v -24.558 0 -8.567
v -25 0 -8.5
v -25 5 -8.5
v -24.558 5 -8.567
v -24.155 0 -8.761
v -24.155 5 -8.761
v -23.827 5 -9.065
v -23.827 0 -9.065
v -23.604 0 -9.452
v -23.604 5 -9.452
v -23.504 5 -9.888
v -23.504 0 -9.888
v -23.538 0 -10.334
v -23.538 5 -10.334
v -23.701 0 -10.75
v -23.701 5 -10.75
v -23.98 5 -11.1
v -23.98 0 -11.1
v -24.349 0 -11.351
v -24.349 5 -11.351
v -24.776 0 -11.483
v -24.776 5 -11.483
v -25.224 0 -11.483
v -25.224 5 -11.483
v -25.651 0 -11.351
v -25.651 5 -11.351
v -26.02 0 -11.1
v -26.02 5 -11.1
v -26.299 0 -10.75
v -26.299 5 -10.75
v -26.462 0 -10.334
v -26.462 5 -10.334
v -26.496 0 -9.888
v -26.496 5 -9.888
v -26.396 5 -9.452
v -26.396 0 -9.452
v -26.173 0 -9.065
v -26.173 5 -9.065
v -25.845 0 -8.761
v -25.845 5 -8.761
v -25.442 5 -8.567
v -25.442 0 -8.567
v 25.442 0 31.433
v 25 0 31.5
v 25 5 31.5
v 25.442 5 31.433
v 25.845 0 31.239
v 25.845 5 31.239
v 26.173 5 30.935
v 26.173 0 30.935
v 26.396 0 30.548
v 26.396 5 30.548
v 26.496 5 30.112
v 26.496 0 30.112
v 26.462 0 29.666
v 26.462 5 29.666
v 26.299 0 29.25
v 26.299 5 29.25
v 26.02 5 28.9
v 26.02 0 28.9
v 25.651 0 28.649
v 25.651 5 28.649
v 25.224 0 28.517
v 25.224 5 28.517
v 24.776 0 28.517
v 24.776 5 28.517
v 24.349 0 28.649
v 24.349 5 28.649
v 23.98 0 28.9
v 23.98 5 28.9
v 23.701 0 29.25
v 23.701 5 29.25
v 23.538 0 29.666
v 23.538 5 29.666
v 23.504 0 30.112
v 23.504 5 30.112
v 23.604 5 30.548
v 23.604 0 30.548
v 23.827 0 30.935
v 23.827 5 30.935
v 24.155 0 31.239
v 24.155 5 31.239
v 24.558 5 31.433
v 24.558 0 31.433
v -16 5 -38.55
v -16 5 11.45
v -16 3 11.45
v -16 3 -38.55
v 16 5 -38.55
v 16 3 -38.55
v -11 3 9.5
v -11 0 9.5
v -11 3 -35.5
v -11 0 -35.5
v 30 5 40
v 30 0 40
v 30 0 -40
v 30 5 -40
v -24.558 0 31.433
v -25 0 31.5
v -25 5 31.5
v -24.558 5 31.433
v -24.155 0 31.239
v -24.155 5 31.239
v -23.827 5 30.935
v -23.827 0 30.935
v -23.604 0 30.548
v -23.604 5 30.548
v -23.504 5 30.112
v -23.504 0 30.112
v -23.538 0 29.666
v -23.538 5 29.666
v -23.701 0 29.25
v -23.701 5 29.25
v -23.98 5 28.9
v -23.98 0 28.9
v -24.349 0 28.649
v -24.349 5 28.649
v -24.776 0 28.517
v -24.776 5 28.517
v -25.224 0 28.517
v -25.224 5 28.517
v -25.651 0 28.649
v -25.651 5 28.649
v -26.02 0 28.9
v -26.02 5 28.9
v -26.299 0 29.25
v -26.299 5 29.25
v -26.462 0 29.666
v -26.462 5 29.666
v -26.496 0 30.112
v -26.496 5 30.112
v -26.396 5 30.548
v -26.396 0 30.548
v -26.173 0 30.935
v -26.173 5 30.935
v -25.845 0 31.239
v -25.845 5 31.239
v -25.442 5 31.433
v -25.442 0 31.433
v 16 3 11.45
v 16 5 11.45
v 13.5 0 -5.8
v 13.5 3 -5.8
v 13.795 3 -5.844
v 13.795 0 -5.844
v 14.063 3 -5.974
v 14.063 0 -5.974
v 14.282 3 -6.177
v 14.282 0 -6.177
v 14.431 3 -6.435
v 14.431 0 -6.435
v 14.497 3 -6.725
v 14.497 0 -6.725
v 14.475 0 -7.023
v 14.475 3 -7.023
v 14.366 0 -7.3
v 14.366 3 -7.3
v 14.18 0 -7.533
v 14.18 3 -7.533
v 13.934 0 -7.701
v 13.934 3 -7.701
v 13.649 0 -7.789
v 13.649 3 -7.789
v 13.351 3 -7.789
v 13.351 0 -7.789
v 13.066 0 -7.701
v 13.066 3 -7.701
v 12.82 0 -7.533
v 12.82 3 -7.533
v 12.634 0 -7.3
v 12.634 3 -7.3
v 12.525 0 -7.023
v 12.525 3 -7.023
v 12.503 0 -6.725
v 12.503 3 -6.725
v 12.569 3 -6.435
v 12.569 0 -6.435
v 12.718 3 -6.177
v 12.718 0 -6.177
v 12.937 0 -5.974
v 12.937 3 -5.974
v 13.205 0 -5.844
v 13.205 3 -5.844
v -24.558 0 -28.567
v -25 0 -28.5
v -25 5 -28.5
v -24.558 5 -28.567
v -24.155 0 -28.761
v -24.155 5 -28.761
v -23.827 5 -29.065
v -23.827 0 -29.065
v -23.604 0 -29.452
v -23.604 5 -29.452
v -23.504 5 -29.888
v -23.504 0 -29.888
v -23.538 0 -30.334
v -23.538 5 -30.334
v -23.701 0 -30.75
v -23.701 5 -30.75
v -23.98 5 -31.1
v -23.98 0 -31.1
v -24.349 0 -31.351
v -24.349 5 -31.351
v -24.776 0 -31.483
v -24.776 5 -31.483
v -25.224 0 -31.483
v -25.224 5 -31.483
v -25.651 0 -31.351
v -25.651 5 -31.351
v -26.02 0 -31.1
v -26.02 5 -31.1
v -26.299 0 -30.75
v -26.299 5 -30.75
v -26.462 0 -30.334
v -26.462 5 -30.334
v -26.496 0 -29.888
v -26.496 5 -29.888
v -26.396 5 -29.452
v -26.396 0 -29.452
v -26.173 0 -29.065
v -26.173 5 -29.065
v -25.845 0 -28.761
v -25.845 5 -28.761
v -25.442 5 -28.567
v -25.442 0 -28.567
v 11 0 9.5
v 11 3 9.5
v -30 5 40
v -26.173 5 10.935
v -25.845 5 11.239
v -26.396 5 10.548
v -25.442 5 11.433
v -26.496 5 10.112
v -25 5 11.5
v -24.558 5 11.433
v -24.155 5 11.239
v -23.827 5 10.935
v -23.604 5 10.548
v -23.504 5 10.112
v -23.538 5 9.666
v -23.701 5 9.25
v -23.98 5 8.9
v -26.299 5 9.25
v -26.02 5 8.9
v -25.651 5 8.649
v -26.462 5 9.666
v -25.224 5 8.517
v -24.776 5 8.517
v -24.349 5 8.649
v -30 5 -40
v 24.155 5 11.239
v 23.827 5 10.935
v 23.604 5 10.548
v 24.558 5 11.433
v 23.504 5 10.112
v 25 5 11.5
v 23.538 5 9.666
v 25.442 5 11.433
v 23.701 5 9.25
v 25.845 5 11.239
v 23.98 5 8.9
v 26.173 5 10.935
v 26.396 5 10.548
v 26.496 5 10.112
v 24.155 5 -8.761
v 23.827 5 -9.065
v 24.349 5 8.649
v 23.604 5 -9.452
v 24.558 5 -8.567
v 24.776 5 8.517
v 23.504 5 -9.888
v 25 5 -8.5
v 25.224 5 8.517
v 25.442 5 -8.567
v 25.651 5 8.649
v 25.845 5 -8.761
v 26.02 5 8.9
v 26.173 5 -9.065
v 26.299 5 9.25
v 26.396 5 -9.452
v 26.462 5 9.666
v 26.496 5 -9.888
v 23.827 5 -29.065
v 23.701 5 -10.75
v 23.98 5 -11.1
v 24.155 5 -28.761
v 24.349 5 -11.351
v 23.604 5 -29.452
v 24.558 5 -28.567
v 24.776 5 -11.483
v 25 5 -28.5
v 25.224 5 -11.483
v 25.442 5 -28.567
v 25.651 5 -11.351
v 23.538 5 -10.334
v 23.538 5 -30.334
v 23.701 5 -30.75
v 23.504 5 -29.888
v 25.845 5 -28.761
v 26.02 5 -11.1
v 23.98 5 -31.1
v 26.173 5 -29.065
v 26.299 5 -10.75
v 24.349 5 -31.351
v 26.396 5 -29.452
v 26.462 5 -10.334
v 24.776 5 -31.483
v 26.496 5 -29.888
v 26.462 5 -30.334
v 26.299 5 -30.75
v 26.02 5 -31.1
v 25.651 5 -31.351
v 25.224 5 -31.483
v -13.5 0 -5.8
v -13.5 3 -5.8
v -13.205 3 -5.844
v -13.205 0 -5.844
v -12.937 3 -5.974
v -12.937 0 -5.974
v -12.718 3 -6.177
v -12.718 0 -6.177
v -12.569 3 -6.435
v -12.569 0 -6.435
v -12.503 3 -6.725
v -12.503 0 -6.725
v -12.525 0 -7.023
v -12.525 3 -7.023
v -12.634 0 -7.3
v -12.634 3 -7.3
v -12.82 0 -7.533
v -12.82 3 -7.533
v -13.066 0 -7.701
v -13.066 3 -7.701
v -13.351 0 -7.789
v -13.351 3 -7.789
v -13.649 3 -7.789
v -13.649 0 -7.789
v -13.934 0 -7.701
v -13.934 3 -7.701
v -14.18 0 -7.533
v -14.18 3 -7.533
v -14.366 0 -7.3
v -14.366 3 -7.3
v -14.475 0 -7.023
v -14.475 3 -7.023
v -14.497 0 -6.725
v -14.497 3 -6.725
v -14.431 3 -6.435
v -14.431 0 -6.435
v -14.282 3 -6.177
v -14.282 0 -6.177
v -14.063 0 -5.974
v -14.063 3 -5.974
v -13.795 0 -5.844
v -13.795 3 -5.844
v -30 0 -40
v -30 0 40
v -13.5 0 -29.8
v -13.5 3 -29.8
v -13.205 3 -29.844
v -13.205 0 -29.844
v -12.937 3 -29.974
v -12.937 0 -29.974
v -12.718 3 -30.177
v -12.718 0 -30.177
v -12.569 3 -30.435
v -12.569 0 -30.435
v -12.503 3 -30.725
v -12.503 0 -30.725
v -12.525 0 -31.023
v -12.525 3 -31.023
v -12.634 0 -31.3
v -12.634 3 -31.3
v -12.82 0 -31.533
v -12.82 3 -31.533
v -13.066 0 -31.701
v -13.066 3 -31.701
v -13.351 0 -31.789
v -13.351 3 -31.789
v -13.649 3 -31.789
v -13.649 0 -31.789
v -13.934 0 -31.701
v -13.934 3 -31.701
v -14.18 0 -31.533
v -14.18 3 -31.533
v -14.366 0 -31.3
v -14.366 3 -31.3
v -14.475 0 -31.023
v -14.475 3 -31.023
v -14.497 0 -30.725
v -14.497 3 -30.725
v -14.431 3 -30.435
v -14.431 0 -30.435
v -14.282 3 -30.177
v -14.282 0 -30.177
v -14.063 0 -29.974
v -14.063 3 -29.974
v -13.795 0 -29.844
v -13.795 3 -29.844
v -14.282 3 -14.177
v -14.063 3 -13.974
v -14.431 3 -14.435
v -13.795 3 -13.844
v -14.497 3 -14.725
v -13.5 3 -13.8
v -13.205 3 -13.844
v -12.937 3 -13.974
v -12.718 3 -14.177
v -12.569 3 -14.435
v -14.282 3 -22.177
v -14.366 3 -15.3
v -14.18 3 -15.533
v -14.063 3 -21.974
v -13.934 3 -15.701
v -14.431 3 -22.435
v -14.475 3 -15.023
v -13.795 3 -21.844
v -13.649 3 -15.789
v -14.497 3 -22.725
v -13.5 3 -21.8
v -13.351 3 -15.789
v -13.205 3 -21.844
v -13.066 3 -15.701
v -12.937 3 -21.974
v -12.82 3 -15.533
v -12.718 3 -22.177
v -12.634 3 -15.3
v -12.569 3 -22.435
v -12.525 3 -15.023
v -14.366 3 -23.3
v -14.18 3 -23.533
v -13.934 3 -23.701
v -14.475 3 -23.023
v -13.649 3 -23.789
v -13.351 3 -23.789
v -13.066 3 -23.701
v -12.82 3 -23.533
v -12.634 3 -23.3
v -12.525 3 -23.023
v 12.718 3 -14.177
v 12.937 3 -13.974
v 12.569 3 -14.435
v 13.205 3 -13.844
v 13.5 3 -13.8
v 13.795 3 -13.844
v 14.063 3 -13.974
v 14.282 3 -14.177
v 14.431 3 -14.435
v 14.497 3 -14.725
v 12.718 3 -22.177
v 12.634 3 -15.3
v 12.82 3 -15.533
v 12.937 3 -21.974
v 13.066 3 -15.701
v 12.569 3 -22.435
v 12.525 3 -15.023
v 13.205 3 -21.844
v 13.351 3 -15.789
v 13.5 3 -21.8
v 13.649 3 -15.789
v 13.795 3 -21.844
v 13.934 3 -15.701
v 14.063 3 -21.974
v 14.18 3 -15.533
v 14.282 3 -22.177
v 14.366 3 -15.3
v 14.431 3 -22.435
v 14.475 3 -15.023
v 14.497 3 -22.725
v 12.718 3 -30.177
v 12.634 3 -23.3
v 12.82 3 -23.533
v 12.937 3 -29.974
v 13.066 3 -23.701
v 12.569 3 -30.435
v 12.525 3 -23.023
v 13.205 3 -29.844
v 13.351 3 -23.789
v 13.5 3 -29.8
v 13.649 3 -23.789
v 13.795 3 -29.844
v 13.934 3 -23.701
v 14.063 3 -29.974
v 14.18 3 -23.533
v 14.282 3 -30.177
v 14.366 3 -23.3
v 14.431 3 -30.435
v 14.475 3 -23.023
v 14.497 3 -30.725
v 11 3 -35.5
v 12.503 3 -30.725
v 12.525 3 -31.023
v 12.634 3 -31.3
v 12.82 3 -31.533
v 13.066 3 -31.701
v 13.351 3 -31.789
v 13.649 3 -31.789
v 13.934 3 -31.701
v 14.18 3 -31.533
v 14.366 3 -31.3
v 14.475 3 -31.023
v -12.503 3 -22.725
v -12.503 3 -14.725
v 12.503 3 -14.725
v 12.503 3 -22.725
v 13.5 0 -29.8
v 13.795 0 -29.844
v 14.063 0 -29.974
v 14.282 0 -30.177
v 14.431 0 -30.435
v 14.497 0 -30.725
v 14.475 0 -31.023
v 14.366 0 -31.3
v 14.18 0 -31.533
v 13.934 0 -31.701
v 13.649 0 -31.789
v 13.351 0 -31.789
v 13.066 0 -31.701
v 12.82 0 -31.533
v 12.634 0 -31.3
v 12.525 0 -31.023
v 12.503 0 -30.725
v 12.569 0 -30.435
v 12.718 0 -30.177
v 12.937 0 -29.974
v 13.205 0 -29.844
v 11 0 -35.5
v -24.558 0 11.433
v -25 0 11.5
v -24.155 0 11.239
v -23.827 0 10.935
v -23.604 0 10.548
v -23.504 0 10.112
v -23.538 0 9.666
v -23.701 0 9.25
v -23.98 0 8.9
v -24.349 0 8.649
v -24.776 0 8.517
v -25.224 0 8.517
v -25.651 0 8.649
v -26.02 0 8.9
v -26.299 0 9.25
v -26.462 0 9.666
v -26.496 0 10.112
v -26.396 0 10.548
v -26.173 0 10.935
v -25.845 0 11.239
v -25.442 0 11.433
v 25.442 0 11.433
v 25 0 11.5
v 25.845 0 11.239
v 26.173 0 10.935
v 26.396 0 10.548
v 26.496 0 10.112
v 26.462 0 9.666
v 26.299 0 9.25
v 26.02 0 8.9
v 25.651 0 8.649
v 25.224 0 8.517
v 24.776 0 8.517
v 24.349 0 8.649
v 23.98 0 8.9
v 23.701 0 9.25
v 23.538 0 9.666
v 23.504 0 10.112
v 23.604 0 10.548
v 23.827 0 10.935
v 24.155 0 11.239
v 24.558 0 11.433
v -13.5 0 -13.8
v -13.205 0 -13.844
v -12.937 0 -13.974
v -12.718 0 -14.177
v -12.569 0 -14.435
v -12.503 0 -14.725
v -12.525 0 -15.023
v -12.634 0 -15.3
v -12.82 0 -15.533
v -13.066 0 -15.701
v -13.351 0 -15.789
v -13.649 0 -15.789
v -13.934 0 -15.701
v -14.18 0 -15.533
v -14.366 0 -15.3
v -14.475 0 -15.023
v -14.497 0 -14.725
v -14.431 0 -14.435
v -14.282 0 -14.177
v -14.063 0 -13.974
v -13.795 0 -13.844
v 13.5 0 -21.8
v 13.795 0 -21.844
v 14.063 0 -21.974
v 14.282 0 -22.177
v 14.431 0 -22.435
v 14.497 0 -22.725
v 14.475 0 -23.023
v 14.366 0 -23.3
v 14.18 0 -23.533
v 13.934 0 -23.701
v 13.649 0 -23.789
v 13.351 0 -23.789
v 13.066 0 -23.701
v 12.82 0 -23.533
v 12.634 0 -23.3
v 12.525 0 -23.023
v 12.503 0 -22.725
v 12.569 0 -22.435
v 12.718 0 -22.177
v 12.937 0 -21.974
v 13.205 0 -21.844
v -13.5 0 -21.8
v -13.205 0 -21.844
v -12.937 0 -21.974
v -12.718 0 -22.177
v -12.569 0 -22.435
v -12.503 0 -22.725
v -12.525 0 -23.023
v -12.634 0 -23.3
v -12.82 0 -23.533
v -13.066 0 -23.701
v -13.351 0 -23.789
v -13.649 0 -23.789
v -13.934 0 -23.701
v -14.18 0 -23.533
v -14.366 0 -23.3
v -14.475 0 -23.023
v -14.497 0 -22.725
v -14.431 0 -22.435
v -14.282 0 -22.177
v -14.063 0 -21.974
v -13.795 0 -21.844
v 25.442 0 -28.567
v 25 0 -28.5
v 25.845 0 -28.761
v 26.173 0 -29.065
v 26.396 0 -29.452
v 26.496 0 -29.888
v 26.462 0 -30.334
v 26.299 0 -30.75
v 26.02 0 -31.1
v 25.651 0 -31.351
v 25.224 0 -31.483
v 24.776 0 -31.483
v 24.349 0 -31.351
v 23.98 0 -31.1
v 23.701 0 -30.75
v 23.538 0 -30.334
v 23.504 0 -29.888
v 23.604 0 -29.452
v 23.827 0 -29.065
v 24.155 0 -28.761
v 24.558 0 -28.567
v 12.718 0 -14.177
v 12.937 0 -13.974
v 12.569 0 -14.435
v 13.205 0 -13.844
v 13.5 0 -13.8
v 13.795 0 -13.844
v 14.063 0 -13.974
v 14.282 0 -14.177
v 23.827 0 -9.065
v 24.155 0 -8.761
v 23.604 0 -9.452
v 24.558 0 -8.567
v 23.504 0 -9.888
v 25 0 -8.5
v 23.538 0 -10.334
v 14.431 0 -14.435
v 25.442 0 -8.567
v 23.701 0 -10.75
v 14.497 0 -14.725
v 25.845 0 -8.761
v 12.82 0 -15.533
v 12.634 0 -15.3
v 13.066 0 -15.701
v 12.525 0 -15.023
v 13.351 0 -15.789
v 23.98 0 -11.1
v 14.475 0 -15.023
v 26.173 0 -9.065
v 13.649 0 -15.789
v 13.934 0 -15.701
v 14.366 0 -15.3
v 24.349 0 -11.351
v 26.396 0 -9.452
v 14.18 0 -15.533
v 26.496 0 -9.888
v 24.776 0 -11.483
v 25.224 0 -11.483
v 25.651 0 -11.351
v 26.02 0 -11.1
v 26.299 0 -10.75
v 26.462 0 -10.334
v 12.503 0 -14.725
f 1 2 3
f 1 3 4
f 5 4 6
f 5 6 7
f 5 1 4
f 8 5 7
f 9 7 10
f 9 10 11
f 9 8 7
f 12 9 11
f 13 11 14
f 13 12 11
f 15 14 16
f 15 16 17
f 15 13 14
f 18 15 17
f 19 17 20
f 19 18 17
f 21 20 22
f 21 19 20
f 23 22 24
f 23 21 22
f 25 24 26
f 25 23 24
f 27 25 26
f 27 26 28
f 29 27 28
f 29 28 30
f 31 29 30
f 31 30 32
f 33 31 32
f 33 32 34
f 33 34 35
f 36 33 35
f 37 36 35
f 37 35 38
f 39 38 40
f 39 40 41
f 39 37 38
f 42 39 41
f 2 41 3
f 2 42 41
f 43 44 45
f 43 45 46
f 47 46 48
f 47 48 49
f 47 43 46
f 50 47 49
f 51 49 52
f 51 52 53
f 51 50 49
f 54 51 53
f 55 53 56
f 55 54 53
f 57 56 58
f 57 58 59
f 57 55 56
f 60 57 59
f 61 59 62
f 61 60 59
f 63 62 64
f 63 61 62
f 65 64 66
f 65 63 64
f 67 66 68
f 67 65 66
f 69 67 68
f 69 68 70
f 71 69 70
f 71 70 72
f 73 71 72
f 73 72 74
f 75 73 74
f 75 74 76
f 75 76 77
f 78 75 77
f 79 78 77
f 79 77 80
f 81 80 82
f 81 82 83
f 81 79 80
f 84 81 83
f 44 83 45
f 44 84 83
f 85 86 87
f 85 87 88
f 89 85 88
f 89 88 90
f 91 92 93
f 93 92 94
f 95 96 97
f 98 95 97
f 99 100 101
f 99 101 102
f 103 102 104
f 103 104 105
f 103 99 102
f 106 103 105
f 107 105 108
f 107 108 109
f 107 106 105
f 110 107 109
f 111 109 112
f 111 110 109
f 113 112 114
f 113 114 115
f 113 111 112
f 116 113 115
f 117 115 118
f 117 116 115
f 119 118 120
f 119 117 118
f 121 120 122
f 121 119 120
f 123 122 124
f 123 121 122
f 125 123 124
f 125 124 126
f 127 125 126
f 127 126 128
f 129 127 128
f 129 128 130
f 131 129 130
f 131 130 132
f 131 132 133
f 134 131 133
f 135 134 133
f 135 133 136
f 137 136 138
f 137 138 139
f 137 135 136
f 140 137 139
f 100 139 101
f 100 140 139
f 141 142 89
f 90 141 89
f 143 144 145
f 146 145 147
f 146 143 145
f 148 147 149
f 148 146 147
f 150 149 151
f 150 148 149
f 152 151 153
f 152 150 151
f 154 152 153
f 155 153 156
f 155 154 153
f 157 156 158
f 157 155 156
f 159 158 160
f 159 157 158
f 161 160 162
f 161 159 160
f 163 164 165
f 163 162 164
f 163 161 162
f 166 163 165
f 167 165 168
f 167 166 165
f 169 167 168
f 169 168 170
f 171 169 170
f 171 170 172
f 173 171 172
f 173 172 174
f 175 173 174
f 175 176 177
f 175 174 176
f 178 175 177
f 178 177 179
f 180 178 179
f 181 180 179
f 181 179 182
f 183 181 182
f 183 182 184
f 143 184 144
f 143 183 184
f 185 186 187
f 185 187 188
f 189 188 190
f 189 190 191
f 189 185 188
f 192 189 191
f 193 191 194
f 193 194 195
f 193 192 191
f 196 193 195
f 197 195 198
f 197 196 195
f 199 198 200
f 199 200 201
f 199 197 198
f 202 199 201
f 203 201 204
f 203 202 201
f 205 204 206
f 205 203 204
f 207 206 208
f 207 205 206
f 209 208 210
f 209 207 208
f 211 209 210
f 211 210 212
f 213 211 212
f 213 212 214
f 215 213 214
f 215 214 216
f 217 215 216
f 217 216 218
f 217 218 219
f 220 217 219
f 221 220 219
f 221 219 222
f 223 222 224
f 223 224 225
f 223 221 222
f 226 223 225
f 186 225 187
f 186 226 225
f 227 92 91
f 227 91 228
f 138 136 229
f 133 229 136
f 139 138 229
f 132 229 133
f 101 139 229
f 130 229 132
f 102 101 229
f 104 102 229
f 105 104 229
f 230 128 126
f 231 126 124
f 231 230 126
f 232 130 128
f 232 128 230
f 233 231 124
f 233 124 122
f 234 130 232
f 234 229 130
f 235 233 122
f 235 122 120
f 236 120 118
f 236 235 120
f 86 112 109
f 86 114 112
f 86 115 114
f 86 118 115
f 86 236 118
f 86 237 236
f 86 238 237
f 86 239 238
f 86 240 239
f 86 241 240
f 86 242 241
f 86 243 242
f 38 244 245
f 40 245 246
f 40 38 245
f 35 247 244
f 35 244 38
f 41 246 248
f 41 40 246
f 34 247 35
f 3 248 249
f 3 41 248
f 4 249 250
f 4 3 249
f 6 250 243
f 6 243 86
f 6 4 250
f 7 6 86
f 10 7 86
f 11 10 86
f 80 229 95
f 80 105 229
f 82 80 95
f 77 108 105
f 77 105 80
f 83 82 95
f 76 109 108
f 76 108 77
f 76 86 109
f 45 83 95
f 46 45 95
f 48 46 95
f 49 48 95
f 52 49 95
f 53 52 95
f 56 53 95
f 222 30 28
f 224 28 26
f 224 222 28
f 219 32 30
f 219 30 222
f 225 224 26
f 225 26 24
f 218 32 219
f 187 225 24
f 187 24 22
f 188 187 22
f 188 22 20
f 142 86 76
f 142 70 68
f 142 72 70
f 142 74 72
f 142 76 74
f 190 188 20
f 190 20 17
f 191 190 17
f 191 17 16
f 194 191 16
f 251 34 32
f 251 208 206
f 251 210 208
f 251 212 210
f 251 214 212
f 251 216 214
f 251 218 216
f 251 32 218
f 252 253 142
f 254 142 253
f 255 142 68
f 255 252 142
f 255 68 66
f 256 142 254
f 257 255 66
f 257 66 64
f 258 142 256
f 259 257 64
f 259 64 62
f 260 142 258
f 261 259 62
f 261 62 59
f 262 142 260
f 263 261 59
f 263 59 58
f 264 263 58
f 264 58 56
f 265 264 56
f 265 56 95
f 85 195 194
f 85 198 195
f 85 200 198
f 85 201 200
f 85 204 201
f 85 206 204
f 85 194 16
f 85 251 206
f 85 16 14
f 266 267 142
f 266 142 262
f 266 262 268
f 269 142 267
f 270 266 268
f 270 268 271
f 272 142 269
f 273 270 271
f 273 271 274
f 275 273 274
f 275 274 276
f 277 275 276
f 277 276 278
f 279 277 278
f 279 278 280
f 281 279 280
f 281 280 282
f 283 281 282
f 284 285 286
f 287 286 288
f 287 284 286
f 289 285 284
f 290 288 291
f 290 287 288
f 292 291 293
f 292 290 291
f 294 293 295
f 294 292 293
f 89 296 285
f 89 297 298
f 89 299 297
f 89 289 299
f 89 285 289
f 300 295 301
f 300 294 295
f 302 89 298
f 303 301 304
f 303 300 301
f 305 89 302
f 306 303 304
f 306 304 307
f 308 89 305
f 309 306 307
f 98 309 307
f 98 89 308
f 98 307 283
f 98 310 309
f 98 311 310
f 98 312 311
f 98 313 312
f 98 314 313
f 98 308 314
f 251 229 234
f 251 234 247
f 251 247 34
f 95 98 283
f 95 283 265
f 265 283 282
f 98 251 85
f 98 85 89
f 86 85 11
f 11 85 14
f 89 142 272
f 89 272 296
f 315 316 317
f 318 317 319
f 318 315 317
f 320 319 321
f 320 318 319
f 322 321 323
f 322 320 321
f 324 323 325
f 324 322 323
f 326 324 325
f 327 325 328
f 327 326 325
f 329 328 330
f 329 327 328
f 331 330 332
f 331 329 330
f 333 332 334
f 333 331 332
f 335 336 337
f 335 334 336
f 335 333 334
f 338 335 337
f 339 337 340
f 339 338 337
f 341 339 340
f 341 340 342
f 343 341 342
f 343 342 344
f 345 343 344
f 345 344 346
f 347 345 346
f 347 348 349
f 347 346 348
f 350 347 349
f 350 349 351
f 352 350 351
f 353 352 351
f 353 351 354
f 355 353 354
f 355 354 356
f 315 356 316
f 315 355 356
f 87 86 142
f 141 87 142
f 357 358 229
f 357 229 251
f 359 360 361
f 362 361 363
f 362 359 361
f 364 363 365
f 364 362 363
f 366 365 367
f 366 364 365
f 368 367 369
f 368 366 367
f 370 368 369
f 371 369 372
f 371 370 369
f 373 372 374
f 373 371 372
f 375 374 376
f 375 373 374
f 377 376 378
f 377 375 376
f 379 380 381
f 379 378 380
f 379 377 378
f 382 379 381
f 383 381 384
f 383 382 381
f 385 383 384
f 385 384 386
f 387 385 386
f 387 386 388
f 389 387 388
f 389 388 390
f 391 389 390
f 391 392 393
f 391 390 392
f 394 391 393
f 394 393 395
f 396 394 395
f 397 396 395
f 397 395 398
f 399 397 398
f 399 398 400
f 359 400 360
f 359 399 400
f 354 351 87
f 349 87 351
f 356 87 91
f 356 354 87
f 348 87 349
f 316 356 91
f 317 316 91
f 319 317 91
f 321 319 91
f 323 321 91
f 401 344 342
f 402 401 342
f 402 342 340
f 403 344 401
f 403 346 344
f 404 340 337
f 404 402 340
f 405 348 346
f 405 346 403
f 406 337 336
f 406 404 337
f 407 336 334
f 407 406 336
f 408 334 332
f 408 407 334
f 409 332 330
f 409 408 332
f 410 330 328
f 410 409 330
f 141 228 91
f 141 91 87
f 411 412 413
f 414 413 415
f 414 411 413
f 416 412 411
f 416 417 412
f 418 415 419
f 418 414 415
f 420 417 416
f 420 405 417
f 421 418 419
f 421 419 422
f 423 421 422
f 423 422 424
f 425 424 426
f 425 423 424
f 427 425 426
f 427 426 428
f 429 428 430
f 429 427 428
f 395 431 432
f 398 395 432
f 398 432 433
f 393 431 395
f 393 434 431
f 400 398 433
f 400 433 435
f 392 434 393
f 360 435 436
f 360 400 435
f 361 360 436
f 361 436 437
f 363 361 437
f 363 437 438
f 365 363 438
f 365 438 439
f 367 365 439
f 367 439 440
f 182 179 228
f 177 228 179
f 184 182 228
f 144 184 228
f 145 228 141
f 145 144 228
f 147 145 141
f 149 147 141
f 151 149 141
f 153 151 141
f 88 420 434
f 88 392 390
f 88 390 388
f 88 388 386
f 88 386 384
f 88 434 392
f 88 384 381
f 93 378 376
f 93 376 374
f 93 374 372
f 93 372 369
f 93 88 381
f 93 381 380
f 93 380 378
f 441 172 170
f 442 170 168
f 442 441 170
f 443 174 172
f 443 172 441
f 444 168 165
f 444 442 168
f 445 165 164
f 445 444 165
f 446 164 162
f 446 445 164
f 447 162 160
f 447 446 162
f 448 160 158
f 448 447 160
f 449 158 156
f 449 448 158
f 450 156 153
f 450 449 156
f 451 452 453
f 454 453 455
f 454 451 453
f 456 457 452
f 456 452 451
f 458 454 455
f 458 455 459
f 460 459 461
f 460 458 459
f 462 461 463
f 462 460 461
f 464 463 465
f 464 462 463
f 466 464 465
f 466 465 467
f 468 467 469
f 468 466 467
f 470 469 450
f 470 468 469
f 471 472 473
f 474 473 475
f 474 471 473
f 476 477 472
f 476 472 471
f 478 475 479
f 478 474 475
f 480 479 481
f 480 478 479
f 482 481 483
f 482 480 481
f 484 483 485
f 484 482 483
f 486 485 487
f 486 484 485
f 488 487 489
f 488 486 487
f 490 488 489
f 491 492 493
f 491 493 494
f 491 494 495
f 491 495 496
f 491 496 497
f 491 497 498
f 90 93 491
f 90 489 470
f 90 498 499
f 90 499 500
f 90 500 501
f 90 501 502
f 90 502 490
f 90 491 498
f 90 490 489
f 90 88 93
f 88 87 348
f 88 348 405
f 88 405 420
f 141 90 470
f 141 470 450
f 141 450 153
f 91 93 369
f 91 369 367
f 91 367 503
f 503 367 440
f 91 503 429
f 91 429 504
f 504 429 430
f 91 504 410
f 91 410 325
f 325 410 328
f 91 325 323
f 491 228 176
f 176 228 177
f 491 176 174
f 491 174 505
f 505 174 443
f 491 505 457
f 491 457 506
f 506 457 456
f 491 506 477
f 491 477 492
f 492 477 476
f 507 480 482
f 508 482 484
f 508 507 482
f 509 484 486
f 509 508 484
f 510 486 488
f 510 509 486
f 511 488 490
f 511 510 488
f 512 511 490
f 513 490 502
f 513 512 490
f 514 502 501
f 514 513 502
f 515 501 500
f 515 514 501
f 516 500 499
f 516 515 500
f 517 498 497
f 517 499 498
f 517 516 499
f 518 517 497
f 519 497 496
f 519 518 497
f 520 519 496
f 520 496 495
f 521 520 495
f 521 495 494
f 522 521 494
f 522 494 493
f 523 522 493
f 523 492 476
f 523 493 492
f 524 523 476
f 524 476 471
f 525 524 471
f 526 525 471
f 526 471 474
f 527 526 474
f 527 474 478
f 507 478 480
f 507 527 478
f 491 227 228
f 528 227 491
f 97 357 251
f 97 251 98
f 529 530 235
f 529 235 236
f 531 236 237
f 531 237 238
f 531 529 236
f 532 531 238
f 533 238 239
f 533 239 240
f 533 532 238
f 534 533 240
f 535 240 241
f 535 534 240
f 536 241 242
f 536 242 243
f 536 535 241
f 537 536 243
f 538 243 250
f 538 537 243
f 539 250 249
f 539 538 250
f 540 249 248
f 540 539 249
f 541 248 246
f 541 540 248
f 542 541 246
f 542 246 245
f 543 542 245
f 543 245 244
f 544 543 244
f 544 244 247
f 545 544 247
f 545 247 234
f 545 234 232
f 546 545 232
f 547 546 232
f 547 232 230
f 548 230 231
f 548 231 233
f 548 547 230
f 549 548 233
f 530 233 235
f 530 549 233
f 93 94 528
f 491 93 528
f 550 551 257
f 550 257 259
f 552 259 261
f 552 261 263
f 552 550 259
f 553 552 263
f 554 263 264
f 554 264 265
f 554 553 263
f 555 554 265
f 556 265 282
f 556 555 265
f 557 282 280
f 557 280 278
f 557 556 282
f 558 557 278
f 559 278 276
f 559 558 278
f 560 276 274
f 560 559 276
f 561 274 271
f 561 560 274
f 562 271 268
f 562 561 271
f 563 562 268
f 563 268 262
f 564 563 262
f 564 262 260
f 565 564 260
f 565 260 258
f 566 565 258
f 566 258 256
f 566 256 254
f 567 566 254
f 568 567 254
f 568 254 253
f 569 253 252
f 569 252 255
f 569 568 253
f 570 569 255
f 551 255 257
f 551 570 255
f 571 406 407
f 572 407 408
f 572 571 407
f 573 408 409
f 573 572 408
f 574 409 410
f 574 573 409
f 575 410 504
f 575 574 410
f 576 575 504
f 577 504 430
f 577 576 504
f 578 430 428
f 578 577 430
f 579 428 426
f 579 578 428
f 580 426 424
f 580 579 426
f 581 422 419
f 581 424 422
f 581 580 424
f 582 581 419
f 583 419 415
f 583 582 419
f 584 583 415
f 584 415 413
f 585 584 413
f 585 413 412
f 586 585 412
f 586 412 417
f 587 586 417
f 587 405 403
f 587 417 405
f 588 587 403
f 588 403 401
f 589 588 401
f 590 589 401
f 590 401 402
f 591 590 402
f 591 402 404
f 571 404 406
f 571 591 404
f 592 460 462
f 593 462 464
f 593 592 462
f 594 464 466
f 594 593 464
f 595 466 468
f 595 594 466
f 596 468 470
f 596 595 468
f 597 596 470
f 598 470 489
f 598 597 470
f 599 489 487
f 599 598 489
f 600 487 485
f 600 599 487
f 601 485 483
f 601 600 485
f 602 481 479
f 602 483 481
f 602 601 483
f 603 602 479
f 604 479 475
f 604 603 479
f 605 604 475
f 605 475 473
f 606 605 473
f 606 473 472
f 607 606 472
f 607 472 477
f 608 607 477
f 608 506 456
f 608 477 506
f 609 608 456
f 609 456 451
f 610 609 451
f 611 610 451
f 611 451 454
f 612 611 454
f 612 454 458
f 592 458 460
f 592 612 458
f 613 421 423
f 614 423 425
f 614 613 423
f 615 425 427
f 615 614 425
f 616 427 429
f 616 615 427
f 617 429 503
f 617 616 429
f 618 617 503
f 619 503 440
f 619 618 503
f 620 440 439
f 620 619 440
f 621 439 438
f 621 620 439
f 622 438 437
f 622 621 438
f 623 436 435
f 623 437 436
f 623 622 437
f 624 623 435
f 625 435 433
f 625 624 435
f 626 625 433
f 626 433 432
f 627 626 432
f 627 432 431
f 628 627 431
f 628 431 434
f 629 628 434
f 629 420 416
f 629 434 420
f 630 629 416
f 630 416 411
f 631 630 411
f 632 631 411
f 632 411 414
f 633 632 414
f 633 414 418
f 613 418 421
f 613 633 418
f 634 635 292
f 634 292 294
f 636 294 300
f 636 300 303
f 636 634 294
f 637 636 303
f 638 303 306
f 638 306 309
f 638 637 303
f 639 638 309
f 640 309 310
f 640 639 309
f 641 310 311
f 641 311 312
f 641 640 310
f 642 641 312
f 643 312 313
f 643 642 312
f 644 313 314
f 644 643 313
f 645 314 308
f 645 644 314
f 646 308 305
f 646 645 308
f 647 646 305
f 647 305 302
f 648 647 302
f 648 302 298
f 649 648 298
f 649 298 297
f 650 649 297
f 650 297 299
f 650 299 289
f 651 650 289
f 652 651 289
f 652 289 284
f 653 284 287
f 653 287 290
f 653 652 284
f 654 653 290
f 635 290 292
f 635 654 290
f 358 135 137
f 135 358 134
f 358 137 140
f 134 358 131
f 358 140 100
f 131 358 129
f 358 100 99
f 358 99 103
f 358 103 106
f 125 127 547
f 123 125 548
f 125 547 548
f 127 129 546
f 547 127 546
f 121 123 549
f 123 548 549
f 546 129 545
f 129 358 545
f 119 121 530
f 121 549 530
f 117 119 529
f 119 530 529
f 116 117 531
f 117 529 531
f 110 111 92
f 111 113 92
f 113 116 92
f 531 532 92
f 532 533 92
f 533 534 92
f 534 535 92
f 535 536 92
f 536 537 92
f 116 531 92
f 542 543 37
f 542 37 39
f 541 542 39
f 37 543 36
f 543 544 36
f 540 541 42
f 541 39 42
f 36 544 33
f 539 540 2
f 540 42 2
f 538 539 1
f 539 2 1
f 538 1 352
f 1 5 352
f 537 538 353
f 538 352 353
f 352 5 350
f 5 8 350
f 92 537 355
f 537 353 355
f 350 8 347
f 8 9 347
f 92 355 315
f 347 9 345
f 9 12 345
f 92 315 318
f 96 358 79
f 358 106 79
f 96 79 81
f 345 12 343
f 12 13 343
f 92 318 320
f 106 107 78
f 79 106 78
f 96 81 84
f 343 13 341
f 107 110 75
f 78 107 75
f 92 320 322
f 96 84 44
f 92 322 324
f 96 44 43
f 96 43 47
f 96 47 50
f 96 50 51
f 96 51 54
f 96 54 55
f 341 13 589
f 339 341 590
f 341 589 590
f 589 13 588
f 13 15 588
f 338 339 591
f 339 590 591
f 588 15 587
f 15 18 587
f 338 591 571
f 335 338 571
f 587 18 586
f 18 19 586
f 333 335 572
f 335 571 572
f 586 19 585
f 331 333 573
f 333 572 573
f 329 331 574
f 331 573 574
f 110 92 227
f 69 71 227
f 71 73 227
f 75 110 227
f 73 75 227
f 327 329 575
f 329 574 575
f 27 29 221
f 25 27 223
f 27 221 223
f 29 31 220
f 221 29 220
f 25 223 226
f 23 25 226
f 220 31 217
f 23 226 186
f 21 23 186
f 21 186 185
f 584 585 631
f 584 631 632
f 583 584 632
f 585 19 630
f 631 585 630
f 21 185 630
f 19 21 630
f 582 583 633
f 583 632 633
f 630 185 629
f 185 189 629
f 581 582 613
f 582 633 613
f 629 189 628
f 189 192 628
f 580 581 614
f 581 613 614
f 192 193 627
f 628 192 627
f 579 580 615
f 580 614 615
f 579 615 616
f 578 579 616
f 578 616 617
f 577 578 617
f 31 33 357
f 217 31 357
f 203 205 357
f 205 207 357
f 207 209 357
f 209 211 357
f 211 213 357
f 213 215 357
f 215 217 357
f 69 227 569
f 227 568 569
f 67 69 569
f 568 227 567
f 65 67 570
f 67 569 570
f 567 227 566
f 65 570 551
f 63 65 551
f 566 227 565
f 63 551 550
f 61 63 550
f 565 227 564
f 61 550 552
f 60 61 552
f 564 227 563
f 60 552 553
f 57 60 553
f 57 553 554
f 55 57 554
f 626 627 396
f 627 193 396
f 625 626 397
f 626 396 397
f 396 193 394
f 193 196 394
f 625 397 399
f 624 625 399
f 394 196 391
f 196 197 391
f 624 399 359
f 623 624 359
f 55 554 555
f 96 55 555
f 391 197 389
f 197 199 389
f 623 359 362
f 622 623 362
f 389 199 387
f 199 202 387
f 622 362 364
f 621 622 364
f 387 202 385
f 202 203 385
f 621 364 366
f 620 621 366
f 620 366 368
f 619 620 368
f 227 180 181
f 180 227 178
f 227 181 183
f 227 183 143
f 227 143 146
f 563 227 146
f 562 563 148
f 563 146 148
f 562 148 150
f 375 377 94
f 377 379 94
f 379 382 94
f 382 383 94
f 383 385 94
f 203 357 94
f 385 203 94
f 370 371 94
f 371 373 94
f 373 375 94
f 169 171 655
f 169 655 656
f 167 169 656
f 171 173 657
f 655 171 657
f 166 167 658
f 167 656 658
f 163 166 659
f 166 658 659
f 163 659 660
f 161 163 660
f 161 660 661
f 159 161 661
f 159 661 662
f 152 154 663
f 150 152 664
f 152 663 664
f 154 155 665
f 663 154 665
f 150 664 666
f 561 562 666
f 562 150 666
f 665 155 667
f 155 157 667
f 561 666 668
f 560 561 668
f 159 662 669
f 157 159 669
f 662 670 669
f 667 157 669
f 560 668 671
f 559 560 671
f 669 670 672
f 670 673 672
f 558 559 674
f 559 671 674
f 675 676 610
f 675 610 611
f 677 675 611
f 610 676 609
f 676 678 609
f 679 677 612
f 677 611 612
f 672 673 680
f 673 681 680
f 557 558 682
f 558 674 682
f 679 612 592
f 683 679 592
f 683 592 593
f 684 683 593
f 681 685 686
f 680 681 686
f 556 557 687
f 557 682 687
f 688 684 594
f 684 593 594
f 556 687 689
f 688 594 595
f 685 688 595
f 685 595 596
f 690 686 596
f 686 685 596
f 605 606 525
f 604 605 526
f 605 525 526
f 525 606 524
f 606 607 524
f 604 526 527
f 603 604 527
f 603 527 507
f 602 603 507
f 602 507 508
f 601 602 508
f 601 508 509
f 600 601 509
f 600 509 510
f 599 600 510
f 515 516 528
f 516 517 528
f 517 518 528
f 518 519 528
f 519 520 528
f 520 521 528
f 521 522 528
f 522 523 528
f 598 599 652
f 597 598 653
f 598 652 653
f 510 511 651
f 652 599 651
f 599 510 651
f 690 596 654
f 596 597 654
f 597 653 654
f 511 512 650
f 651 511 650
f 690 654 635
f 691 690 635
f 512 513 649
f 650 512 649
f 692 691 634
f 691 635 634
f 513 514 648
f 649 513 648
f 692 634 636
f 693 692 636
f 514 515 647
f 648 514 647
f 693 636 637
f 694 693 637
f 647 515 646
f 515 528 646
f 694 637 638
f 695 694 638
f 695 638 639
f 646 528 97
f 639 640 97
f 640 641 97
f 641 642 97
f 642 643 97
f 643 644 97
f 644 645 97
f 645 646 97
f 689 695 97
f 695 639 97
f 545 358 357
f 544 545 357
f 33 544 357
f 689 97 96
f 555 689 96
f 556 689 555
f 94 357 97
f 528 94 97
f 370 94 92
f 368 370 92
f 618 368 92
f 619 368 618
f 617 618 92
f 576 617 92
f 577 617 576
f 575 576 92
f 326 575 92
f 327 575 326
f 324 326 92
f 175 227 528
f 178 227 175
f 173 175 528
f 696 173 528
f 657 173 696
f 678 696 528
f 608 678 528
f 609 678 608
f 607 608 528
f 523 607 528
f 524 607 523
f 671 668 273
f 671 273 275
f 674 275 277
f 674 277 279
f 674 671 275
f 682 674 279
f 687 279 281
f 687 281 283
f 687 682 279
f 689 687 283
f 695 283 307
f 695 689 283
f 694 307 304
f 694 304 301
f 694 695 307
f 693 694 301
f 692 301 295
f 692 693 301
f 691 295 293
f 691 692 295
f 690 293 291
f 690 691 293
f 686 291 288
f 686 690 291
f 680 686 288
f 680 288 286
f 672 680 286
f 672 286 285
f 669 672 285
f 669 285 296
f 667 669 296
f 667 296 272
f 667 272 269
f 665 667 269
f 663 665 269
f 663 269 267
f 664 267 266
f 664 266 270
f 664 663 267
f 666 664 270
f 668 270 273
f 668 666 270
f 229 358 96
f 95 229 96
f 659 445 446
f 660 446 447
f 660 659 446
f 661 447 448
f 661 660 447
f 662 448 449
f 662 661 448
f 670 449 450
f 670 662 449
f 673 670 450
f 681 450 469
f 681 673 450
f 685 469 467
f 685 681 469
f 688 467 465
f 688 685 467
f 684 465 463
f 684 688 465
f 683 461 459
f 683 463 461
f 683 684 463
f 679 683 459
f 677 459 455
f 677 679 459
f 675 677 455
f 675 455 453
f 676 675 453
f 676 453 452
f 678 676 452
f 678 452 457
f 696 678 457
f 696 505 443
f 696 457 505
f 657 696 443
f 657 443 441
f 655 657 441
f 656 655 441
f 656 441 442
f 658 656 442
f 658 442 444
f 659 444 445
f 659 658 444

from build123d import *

# Parameters (mm, degrees)
SKETCH3_W           = 60
SKETCH3_H           = 80
SKETCH3_R           = 1
SKETCH3_R_2         = 1.5
SKETCH3_W_2         = 22
SKETCH3_H_2         = 45
BOSS_EXTRUDE1_DEPTH = 5
SKETCH4_W           = 32
SKETCH4_H           = 50
CUT_EXTRUDE1_DEPTH  = 2


with BuildPart() as part:
    # Sketch3 → Boss-Extrude1 (new body)
    with BuildSketch(Plane(origin=(0, 0, 0), x_dir=(1, 0, 0), z_dir=(0, 1, 0))):
        Rectangle(SKETCH3_W, SKETCH3_H)
        with Locations(Location((-13.5, 22.8, 0), (0, 0, 270))):
            Circle(SKETCH3_R, mode=Mode.SUBTRACT)
        with Locations(Location((13.5, 22.8, 0), (0, 0, 270))):
            Circle(SKETCH3_R, mode=Mode.SUBTRACT)
        with Locations(Location((-13.5, 14.8, 0), (0, 0, 270))):
            Circle(SKETCH3_R, mode=Mode.SUBTRACT)
        with Locations(Location((-13.5, 6.8, 0), (0, 0, 270))):
            Circle(SKETCH3_R, mode=Mode.SUBTRACT)
        with Locations(Location((13.5, 14.8, 0), (0, 0, 270))):
            Circle(SKETCH3_R, mode=Mode.SUBTRACT)
        with Locations(Location((13.5, 6.8, 0), (0, 0, 270))):
            Circle(SKETCH3_R, mode=Mode.SUBTRACT)
        with Locations(Location((-13.5, 30.8, 0), (0, 0, 270))):
            Circle(SKETCH3_R, mode=Mode.SUBTRACT)
        with Locations(Location((13.5, 30.8, 0), (0, 0, 270))):
            Circle(SKETCH3_R, mode=Mode.SUBTRACT)
        with Locations(Location((-25, 30, 0), (0, 0, 270))):
            Circle(SKETCH3_R_2, mode=Mode.SUBTRACT)
        with Locations(Location((25, 30, 0), (0, 0, 270))):
            Circle(SKETCH3_R_2, mode=Mode.SUBTRACT)
        with Locations(Location((-25, 10, 0), (0, 0, 270))):
            Circle(SKETCH3_R_2, mode=Mode.SUBTRACT)
        with Locations(Location((-25, -10, 0), (0, 0, 270))):
            Circle(SKETCH3_R_2, mode=Mode.SUBTRACT)
        with Locations(Location((-25, -30, 0), (0, 0, 270))):
            Circle(SKETCH3_R_2, mode=Mode.SUBTRACT)
        with Locations(Location((25, 10, 0), (0, 0, 270))):
            Circle(SKETCH3_R_2, mode=Mode.SUBTRACT)
        with Locations(Location((25, -10, 0), (0, 0, 270))):
            Circle(SKETCH3_R_2, mode=Mode.SUBTRACT)
        with Locations(Location((25, -30, 0), (0, 0, 270))):
            Circle(SKETCH3_R_2, mode=Mode.SUBTRACT)
        with Locations((0, 13)):
            Rectangle(SKETCH3_W_2, SKETCH3_H_2, mode=Mode.SUBTRACT)
    extrude(amount=BOSS_EXTRUDE1_DEPTH)

    # Sketch4 → Cut-Extrude1 (cut)
    with BuildSketch(Plane(origin=(0, 5, 0), x_dir=(1, 0, 0), z_dir=(0, 1, 0))):
        with Locations((0, 13.55)):
            Rectangle(SKETCH4_W, SKETCH4_H)
    extrude(amount=-CUT_EXTRUDE1_DEPTH, mode=Mode.SUBTRACT)


solid = part.part
